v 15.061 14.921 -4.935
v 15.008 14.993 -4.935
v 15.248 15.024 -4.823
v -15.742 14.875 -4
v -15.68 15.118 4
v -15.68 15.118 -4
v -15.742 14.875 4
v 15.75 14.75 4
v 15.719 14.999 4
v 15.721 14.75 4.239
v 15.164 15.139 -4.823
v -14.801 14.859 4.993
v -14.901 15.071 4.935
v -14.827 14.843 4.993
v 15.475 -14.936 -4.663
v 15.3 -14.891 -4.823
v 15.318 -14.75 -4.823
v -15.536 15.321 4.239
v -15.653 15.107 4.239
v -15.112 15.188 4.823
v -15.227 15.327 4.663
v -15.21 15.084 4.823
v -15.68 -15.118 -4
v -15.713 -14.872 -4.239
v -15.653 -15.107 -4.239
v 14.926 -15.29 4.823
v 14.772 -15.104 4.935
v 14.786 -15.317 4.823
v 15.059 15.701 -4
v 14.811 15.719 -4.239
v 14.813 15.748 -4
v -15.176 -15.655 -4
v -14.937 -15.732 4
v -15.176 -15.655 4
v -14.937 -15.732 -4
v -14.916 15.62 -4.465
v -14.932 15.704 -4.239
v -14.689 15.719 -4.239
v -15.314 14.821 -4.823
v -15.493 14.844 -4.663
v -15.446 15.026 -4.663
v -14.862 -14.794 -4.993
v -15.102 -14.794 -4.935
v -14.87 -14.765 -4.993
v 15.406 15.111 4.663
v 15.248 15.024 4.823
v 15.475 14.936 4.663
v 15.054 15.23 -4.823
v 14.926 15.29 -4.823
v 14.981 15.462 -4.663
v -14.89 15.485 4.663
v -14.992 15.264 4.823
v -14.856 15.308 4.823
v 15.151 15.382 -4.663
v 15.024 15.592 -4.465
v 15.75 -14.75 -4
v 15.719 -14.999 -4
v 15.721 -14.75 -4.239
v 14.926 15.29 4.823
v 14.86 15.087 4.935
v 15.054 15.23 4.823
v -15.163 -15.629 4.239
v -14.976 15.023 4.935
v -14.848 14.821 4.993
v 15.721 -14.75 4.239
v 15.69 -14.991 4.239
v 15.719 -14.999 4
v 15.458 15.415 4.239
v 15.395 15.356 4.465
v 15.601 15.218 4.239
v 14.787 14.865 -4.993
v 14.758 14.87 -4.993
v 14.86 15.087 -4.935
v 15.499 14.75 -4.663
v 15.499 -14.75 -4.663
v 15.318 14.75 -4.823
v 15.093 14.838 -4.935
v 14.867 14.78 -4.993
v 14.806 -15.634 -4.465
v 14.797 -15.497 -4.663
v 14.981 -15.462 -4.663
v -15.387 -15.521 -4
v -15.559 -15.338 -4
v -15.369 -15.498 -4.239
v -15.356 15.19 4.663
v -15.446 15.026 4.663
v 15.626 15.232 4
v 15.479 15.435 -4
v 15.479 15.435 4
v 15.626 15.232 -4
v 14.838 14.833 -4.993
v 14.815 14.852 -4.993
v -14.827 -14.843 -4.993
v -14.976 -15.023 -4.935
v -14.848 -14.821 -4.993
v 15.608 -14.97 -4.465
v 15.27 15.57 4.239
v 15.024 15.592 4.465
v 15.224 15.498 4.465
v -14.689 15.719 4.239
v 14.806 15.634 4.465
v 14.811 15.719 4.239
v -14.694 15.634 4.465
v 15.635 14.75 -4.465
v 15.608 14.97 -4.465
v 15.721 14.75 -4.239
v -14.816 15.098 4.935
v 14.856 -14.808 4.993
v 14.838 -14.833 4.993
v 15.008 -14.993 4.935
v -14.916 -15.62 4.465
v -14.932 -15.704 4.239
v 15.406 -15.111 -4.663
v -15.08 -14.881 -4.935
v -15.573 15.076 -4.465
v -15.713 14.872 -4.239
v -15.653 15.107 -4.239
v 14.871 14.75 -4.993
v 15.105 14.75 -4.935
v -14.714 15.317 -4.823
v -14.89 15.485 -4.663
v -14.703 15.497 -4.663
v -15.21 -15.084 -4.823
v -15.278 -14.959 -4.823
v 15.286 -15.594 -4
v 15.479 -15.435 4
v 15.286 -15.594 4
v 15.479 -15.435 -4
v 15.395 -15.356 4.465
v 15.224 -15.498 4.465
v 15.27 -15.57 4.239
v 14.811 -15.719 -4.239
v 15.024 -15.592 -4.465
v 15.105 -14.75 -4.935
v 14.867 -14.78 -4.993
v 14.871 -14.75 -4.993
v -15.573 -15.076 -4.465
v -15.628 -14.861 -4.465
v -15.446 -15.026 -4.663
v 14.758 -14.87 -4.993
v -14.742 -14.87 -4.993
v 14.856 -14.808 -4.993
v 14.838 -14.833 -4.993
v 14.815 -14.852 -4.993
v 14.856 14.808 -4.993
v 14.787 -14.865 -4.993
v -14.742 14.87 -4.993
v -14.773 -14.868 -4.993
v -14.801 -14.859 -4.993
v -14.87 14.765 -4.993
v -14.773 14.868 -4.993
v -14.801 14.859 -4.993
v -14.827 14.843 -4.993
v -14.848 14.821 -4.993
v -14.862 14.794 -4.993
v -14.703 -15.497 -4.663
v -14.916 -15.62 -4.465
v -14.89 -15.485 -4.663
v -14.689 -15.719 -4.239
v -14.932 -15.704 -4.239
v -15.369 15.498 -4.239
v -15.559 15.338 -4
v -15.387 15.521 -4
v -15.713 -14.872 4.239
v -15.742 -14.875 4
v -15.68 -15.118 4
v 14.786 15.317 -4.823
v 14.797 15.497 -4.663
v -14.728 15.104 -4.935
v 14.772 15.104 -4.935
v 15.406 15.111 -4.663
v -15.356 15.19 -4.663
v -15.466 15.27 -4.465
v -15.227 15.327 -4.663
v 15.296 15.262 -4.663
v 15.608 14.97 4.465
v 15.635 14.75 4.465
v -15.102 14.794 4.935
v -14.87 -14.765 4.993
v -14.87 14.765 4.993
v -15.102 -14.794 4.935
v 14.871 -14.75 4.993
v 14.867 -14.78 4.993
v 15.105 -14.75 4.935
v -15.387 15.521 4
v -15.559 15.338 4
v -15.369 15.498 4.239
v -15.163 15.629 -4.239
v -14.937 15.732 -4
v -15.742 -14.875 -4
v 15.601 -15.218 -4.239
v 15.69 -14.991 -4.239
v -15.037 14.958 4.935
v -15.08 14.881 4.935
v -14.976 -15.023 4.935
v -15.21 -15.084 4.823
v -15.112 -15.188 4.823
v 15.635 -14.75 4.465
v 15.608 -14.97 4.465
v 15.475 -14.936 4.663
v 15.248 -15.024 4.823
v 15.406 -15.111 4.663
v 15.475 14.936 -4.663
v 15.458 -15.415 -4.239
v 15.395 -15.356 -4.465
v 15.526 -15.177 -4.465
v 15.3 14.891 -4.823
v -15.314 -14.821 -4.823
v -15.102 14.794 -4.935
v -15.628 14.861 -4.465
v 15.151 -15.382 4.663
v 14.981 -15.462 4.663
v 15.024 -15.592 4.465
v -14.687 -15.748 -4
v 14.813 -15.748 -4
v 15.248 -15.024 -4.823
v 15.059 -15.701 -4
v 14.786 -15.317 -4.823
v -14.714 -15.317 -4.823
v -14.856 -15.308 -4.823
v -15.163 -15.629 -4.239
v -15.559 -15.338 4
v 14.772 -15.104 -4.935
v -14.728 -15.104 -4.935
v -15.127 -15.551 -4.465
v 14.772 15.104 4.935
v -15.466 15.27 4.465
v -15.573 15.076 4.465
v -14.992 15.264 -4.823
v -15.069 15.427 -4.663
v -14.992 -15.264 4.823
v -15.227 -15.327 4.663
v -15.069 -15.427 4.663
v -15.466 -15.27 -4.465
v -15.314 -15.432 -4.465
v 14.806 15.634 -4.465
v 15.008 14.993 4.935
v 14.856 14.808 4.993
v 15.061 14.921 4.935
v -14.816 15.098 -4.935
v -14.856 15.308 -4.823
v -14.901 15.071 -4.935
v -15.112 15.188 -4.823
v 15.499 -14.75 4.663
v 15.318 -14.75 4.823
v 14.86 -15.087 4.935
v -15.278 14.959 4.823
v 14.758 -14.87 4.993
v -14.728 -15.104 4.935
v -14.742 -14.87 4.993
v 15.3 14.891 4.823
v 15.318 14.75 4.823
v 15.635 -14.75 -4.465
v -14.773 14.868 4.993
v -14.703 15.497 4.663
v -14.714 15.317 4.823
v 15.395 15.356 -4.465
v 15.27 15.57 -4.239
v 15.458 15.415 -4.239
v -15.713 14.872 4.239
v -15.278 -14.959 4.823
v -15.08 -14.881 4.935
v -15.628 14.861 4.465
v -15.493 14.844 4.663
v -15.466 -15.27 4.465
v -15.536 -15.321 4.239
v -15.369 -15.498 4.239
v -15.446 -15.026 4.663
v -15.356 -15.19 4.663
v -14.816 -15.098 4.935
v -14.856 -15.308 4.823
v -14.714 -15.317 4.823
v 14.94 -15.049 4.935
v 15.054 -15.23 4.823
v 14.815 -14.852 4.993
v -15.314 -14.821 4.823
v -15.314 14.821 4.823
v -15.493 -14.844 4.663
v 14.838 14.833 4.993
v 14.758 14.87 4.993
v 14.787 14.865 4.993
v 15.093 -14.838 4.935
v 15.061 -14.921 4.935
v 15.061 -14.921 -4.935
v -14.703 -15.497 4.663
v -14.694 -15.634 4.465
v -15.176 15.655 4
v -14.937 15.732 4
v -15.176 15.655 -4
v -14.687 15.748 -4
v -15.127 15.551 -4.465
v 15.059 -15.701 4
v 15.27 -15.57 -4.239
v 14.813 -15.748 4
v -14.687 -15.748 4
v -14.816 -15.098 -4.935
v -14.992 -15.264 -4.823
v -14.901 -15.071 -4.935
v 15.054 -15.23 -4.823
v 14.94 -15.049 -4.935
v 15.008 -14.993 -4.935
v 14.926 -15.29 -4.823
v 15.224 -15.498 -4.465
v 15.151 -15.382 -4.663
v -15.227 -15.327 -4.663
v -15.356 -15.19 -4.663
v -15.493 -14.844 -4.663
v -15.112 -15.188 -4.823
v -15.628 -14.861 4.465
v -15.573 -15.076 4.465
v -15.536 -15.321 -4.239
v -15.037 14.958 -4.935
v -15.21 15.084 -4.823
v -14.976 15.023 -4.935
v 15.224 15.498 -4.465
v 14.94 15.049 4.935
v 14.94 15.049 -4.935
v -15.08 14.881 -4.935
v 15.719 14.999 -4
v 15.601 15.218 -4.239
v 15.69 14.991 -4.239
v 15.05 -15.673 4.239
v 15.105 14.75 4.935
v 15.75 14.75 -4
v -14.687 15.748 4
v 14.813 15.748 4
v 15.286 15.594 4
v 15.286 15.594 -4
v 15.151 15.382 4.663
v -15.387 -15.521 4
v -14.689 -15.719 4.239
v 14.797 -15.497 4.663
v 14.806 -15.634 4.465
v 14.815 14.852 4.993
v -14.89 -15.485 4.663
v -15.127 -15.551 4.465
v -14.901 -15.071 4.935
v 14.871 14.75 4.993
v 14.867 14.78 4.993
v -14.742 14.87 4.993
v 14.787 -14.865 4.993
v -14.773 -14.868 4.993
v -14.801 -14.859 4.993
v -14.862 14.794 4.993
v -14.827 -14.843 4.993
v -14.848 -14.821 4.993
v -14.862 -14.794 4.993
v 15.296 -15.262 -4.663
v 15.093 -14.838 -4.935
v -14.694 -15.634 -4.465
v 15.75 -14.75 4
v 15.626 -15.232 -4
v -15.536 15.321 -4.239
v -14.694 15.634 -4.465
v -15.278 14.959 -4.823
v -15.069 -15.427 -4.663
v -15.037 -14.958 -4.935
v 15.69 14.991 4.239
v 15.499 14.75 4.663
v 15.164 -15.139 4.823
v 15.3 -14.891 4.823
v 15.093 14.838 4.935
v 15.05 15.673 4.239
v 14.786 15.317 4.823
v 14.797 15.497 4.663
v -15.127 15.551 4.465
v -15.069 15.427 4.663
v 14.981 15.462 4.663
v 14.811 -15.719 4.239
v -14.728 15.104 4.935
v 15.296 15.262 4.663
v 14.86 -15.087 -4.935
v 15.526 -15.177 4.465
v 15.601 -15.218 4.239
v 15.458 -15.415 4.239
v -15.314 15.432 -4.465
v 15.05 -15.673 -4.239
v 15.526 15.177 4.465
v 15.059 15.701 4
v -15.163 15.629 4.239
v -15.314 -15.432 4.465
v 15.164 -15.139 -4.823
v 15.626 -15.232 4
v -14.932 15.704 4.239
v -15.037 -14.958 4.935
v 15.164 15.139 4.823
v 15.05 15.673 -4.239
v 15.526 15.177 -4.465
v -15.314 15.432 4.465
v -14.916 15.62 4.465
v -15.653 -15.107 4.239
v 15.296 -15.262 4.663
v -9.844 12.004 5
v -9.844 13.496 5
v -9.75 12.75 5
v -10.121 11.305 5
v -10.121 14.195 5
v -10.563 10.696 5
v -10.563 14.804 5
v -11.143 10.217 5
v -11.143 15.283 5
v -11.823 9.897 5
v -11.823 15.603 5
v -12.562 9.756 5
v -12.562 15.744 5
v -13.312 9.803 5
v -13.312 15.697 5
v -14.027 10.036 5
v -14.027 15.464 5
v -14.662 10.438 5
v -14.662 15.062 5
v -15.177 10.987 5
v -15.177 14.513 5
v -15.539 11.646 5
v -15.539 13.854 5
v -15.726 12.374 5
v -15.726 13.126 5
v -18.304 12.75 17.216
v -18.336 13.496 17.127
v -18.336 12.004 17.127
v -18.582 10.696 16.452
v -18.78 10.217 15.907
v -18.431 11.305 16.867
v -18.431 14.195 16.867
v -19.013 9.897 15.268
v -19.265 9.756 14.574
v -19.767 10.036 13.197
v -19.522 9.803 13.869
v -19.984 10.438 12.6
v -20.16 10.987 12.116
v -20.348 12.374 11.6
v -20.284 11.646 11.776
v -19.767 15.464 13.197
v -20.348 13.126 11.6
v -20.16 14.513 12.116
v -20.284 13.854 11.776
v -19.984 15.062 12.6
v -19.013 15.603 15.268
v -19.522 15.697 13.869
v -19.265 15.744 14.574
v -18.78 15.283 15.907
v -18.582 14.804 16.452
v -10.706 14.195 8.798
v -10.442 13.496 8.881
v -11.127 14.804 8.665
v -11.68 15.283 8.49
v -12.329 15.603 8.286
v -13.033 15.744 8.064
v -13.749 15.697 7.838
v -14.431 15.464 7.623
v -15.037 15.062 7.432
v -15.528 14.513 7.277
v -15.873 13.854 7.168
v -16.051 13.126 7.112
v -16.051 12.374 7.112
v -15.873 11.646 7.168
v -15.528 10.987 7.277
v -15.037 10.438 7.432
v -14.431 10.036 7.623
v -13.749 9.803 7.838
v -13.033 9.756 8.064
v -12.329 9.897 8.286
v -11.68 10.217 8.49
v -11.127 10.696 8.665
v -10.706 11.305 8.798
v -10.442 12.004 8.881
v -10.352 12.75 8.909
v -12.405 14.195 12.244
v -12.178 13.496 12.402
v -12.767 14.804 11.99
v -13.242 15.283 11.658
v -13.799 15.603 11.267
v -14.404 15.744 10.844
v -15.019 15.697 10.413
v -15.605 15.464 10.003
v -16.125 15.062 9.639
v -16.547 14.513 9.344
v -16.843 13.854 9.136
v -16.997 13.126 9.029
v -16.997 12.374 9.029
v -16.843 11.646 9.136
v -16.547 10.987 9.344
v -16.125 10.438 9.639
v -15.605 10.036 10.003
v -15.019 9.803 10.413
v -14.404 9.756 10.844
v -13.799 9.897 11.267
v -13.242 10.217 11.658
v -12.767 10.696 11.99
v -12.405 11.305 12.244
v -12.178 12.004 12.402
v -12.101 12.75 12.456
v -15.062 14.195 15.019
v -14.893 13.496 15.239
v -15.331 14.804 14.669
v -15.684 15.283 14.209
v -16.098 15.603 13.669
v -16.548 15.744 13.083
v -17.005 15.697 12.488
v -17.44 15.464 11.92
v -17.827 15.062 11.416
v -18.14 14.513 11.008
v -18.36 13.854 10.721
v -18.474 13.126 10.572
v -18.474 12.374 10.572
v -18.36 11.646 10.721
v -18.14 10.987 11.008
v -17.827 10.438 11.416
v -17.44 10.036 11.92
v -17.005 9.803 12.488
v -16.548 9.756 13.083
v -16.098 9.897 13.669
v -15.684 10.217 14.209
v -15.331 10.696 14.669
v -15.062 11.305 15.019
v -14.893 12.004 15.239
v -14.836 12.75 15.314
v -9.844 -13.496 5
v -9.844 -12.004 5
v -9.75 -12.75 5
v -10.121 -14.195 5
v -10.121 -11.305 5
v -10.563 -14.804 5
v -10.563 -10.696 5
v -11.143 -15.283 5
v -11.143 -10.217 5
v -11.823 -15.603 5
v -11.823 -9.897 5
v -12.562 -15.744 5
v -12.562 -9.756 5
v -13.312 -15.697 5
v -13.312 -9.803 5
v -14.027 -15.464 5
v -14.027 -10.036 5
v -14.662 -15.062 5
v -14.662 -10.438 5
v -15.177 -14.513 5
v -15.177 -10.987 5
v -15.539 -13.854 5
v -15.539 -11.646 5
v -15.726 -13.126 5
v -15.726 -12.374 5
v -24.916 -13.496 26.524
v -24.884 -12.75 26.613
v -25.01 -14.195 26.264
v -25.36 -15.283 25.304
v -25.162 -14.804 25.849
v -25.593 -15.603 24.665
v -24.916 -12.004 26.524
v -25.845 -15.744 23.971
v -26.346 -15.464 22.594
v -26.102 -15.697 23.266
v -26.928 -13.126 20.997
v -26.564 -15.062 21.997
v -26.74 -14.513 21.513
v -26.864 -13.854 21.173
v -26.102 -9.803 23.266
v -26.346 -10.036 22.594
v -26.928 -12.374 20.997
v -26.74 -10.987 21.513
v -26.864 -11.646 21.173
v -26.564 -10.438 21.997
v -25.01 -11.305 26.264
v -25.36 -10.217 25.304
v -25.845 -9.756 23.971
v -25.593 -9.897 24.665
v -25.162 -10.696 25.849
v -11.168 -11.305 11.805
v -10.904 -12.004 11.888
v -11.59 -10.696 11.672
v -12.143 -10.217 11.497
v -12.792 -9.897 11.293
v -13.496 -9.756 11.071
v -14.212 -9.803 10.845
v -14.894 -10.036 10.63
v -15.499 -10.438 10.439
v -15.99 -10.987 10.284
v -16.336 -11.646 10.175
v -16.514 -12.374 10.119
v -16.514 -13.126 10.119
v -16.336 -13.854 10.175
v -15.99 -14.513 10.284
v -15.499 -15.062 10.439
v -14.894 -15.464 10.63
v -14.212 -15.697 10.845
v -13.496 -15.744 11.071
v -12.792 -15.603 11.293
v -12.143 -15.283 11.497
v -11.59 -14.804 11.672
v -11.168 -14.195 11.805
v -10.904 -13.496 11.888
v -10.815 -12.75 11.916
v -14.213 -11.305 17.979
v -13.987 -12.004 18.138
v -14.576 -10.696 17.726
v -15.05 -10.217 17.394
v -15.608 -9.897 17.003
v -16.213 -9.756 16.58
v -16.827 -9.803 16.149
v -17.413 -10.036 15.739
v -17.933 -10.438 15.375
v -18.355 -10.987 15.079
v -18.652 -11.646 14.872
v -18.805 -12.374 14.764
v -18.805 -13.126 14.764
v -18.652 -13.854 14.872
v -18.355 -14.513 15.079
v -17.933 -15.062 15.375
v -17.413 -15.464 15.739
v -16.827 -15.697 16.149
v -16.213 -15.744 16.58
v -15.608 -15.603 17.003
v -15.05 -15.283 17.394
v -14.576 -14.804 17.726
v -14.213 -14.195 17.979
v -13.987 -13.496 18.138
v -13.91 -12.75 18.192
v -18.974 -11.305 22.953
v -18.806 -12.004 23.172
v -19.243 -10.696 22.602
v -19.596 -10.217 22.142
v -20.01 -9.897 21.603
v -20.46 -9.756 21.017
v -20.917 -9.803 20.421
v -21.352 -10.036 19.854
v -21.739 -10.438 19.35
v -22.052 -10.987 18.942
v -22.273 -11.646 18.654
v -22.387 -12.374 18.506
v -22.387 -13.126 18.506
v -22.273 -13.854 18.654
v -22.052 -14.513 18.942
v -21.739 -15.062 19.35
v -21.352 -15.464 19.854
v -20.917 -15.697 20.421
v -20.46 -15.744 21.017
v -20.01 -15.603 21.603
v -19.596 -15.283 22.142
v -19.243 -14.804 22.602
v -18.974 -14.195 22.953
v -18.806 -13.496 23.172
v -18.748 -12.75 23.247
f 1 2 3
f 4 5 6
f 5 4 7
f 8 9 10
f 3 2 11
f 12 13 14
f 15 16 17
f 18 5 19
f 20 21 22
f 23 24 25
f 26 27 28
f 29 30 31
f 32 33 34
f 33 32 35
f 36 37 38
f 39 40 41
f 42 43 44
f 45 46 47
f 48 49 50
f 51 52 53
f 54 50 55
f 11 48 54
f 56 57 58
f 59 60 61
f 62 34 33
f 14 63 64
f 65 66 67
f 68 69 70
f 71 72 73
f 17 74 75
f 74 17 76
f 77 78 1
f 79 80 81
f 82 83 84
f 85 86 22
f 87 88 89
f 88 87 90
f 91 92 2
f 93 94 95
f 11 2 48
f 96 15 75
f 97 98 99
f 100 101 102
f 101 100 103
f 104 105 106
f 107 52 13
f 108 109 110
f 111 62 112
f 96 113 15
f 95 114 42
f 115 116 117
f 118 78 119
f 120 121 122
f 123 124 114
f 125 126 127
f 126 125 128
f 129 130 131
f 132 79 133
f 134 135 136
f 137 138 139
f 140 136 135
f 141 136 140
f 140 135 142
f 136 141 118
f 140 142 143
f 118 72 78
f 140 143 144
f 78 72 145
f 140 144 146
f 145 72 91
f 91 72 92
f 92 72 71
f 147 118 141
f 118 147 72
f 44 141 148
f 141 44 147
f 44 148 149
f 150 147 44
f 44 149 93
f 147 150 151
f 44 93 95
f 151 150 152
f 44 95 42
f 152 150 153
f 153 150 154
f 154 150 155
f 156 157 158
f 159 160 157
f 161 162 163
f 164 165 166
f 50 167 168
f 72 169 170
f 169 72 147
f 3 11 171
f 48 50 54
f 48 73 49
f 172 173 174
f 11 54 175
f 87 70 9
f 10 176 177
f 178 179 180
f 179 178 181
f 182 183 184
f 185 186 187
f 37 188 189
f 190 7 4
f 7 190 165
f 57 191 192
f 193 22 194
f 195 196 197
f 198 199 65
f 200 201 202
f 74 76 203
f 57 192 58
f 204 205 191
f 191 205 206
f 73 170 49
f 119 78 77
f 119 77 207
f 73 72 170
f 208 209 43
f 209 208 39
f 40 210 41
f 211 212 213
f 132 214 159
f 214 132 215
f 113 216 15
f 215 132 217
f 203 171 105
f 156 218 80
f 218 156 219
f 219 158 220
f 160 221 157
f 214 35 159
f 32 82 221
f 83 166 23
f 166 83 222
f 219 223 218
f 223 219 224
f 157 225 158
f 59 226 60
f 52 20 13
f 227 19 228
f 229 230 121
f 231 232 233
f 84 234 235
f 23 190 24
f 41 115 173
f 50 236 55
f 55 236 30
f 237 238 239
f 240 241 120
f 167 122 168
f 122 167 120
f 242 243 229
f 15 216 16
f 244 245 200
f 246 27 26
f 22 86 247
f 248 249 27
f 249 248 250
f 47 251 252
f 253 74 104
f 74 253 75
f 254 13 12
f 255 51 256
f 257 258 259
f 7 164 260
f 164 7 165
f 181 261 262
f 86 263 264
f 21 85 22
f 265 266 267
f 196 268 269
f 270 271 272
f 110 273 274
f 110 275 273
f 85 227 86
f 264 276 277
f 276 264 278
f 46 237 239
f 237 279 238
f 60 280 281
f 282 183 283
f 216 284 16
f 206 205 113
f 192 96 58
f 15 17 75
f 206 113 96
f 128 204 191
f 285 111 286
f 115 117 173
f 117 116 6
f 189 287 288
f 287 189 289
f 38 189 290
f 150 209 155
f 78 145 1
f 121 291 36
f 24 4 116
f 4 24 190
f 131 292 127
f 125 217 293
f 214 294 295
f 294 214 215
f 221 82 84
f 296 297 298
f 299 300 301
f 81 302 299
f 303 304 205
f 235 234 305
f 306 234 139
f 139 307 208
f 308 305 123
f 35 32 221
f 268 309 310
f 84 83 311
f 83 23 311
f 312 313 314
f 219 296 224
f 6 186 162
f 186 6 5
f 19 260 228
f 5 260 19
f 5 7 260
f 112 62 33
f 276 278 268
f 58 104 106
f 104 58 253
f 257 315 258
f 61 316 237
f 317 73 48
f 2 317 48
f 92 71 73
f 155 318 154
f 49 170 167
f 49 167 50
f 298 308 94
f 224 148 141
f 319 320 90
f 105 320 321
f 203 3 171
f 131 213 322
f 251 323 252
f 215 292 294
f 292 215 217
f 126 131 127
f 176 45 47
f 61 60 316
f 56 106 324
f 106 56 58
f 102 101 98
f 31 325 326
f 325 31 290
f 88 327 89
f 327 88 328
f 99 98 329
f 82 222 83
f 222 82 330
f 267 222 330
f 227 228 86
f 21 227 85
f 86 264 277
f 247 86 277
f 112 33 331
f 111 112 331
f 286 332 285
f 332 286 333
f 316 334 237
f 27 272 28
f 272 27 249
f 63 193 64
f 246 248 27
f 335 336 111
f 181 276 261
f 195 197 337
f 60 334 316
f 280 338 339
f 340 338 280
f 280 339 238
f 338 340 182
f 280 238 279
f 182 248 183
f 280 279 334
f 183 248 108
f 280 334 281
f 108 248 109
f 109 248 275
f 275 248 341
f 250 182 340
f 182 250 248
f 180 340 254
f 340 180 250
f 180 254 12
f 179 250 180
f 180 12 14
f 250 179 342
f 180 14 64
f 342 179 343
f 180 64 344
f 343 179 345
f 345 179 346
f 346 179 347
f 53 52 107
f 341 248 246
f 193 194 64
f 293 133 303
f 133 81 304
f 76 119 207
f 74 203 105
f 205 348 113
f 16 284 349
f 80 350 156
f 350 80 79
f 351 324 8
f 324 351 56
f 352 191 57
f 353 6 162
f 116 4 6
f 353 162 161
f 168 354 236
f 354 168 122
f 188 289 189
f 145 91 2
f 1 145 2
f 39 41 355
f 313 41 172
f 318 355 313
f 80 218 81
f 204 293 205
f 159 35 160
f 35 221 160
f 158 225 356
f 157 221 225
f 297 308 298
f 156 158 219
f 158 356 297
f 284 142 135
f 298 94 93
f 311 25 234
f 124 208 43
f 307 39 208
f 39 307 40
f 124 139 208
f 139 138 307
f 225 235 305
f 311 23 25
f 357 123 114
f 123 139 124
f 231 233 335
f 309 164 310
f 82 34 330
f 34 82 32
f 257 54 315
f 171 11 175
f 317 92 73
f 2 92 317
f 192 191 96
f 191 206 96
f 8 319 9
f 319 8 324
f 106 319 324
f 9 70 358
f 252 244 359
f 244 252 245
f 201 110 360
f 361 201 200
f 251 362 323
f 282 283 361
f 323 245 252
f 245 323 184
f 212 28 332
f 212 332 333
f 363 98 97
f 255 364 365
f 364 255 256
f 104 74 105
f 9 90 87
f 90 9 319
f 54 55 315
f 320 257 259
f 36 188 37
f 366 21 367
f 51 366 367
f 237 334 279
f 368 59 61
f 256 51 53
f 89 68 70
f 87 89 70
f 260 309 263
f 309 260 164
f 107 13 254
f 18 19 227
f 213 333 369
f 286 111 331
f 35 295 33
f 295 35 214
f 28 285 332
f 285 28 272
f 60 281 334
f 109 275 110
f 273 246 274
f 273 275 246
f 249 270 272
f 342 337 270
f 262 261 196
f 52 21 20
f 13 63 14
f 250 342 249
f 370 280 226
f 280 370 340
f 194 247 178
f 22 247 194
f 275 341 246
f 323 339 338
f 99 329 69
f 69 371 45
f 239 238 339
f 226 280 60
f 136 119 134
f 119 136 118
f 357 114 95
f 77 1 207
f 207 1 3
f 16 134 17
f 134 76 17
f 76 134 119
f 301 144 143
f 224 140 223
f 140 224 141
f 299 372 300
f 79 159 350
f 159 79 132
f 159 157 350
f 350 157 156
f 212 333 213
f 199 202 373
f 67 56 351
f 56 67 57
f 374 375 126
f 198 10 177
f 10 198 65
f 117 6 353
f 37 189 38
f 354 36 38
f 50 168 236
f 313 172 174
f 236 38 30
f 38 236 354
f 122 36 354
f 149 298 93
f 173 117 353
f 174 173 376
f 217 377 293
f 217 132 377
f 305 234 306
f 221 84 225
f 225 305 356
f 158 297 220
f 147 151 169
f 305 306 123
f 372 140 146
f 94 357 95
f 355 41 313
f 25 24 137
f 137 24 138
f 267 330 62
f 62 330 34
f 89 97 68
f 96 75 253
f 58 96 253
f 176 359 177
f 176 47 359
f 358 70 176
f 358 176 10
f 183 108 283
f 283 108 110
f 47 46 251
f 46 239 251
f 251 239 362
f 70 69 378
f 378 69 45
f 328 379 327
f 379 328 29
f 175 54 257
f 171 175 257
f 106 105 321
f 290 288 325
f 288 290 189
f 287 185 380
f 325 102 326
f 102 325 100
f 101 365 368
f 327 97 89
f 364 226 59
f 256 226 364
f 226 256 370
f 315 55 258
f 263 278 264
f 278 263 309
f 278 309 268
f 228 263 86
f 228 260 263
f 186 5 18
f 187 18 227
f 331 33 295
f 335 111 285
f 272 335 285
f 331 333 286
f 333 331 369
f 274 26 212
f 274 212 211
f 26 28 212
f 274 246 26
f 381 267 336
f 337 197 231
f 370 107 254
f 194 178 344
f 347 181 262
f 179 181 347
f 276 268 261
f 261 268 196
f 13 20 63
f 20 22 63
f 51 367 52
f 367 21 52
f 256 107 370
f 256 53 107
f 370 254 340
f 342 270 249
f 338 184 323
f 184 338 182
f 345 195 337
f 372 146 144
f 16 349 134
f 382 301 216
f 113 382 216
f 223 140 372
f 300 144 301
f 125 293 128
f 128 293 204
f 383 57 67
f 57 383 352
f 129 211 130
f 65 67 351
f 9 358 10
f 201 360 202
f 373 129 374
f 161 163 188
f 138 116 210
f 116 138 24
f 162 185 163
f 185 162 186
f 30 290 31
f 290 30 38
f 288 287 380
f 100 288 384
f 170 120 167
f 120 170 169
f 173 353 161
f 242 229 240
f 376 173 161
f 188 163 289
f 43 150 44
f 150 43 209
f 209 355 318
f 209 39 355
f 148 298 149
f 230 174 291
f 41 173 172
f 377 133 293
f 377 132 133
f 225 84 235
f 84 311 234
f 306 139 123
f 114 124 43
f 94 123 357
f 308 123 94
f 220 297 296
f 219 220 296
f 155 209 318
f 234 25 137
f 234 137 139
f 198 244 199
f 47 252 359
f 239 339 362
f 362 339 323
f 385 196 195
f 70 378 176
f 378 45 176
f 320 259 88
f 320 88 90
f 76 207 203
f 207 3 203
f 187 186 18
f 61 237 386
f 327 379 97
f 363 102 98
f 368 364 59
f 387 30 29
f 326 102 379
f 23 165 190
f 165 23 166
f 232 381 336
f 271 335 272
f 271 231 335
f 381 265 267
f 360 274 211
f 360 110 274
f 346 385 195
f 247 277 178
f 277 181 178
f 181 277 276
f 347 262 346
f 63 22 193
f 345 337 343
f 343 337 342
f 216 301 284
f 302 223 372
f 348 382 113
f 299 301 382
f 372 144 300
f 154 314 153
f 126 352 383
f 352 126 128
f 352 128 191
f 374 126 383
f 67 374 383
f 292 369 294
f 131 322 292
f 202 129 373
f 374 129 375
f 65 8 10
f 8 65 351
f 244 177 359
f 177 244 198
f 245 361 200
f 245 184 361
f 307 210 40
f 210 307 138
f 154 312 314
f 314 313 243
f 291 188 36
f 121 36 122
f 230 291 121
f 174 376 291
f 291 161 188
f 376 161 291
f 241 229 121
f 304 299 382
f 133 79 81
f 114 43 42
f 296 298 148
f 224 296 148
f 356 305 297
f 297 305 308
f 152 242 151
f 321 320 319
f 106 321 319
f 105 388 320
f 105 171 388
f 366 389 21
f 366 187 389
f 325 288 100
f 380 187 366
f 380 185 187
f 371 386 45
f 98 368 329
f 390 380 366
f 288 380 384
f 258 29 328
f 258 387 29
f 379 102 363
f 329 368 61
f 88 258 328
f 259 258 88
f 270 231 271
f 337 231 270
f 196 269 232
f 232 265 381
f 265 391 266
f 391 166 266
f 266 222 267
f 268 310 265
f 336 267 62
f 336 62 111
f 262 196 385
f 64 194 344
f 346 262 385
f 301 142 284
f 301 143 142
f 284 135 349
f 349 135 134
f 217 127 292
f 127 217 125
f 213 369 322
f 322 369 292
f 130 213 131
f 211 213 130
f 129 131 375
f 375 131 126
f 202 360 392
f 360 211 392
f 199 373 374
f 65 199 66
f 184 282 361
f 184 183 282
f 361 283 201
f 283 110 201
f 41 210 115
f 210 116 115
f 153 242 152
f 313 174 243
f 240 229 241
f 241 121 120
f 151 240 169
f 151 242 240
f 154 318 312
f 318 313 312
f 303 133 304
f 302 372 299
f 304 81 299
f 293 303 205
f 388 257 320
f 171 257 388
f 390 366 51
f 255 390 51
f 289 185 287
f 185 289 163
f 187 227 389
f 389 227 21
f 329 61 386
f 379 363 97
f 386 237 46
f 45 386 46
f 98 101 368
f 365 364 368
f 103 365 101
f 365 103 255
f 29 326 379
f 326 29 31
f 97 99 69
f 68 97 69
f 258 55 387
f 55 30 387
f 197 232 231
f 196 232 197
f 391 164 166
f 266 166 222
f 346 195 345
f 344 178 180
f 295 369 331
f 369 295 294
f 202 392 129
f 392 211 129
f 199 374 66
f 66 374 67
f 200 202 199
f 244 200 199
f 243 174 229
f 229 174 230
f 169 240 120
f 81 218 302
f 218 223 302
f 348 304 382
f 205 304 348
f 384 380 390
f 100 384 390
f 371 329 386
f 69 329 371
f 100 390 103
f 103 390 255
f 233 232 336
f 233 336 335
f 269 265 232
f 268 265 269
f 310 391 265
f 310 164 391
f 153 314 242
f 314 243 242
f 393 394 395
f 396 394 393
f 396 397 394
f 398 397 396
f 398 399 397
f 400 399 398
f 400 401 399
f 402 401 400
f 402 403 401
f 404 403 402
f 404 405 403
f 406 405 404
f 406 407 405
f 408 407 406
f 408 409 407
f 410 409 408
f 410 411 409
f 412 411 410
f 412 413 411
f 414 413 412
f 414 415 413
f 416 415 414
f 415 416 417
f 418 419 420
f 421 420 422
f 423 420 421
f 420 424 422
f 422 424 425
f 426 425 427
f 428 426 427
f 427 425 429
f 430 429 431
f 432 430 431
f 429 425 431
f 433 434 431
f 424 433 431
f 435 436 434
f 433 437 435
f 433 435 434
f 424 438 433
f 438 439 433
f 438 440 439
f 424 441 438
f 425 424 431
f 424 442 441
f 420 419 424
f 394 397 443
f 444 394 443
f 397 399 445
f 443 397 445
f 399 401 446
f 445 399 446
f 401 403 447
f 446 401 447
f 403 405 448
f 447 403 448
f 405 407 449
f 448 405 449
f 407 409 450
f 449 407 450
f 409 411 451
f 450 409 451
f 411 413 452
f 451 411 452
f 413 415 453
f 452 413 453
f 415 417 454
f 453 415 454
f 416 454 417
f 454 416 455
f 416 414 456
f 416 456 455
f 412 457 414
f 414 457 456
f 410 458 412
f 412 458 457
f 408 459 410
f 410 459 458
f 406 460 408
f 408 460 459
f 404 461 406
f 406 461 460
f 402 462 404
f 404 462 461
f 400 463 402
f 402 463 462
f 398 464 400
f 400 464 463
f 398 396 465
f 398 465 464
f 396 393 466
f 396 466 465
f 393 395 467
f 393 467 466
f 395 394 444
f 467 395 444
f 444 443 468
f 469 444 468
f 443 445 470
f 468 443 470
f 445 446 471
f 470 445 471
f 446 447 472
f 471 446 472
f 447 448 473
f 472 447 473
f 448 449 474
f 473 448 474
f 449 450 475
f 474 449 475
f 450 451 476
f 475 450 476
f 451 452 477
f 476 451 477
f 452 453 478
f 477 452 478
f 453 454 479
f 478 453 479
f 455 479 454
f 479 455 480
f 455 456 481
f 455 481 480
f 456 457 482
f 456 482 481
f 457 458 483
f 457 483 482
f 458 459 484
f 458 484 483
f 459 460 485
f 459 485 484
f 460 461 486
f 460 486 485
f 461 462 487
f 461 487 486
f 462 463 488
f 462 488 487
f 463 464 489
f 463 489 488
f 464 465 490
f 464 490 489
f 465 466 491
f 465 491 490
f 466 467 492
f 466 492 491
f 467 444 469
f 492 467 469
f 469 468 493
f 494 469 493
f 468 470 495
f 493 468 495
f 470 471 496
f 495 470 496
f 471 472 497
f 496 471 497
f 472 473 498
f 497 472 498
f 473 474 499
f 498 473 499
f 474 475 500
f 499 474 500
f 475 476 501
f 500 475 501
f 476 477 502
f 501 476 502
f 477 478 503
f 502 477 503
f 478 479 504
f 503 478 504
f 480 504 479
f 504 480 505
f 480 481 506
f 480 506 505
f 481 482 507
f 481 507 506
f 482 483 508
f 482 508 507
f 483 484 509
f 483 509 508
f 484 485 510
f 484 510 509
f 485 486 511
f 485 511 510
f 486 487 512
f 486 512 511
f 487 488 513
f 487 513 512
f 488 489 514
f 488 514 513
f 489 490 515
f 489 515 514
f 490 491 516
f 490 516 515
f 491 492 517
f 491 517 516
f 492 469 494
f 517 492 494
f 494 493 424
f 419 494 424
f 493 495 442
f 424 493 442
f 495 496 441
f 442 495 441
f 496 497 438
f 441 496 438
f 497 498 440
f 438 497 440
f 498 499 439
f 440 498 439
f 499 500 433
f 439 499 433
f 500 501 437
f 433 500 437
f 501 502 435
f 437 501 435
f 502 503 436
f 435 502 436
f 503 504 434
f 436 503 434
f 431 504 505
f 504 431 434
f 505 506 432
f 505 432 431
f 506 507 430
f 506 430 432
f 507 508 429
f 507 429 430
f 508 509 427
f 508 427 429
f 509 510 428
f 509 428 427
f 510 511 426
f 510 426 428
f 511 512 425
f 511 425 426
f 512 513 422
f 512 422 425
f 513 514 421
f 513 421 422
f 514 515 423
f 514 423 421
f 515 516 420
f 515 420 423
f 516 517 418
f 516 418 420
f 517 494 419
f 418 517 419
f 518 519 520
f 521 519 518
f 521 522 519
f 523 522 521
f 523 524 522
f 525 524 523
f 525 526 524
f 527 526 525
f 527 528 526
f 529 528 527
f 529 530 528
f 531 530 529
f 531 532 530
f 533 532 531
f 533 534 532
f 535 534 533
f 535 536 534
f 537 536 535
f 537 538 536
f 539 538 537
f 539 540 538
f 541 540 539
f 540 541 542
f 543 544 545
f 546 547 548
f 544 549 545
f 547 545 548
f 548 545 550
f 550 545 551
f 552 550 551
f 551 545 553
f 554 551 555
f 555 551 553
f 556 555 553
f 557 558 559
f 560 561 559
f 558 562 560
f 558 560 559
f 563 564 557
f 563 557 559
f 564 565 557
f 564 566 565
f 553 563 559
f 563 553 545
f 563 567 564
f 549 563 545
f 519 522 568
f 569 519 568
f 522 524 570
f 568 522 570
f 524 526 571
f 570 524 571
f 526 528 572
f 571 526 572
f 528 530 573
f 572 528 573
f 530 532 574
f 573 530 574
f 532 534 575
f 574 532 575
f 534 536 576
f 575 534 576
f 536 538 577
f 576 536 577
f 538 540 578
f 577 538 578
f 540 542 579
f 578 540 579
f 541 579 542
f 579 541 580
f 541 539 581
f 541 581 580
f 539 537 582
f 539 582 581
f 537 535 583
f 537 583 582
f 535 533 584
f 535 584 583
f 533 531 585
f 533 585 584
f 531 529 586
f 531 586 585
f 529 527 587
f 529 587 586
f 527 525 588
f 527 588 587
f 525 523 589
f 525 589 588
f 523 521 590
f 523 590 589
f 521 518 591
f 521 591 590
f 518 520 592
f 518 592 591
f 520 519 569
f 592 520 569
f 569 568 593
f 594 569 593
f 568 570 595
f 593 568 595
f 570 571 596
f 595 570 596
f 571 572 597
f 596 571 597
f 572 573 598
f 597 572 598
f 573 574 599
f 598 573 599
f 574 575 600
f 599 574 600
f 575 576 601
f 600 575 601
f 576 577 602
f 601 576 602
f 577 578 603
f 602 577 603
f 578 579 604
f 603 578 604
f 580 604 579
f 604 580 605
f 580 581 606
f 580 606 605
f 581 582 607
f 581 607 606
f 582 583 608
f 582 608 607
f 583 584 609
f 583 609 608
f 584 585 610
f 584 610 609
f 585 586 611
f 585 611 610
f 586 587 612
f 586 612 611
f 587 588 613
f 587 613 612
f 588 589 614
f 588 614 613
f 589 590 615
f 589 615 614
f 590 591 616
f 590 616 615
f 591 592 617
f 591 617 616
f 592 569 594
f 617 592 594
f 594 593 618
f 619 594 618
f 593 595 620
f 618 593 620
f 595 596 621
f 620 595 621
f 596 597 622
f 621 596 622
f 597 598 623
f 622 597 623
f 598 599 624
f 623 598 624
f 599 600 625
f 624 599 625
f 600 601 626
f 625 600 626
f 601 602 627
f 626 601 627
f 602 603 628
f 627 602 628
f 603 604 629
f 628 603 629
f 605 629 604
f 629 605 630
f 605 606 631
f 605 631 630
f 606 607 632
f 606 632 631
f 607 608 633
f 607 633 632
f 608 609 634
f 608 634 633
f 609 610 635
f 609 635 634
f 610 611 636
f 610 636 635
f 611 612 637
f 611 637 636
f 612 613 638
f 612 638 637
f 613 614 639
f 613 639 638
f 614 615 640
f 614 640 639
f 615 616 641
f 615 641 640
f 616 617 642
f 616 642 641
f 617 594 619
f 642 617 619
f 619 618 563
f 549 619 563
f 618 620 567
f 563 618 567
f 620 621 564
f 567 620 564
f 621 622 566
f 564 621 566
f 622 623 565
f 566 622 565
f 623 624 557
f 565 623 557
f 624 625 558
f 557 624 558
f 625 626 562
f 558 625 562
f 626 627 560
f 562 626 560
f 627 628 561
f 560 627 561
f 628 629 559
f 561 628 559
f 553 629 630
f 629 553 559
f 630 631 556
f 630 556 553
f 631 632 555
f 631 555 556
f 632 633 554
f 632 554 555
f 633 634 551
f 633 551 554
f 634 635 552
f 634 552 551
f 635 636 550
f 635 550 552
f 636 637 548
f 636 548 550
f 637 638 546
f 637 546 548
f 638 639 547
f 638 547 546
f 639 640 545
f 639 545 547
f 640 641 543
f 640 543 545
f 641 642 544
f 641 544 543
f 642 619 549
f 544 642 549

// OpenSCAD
$fn = 25;

roundcorner = 2; 

horn_arc = 70;

color("blue") minkowski() {
    cube([25.5 - roundcorner + 6, 25.5 - roundcorner + 6, 10 - roundcorner], center = true);
    sphere(d = roundcorner);
}

// translate([1, 1, 1])  cube([15.5, 25.5, 9], center = true);

translate([(-12.75 - 10), 12.75, 5]) {
    rotate([90, 0, 0]) {
        color("red") rotate_extrude(angle=horn_arc) {
            translate([10, 0]) {
                circle(d=6);
            }
        }
    }
}


translate([(-12.75 - 20), -12.75, 5]) {
    rotate([90, 0, 0]) {
        color("red") rotate_extrude(angle=horn_arc) {
            translate([20, 0]) {
                circle(d=6);
            }
        }
    }
}
